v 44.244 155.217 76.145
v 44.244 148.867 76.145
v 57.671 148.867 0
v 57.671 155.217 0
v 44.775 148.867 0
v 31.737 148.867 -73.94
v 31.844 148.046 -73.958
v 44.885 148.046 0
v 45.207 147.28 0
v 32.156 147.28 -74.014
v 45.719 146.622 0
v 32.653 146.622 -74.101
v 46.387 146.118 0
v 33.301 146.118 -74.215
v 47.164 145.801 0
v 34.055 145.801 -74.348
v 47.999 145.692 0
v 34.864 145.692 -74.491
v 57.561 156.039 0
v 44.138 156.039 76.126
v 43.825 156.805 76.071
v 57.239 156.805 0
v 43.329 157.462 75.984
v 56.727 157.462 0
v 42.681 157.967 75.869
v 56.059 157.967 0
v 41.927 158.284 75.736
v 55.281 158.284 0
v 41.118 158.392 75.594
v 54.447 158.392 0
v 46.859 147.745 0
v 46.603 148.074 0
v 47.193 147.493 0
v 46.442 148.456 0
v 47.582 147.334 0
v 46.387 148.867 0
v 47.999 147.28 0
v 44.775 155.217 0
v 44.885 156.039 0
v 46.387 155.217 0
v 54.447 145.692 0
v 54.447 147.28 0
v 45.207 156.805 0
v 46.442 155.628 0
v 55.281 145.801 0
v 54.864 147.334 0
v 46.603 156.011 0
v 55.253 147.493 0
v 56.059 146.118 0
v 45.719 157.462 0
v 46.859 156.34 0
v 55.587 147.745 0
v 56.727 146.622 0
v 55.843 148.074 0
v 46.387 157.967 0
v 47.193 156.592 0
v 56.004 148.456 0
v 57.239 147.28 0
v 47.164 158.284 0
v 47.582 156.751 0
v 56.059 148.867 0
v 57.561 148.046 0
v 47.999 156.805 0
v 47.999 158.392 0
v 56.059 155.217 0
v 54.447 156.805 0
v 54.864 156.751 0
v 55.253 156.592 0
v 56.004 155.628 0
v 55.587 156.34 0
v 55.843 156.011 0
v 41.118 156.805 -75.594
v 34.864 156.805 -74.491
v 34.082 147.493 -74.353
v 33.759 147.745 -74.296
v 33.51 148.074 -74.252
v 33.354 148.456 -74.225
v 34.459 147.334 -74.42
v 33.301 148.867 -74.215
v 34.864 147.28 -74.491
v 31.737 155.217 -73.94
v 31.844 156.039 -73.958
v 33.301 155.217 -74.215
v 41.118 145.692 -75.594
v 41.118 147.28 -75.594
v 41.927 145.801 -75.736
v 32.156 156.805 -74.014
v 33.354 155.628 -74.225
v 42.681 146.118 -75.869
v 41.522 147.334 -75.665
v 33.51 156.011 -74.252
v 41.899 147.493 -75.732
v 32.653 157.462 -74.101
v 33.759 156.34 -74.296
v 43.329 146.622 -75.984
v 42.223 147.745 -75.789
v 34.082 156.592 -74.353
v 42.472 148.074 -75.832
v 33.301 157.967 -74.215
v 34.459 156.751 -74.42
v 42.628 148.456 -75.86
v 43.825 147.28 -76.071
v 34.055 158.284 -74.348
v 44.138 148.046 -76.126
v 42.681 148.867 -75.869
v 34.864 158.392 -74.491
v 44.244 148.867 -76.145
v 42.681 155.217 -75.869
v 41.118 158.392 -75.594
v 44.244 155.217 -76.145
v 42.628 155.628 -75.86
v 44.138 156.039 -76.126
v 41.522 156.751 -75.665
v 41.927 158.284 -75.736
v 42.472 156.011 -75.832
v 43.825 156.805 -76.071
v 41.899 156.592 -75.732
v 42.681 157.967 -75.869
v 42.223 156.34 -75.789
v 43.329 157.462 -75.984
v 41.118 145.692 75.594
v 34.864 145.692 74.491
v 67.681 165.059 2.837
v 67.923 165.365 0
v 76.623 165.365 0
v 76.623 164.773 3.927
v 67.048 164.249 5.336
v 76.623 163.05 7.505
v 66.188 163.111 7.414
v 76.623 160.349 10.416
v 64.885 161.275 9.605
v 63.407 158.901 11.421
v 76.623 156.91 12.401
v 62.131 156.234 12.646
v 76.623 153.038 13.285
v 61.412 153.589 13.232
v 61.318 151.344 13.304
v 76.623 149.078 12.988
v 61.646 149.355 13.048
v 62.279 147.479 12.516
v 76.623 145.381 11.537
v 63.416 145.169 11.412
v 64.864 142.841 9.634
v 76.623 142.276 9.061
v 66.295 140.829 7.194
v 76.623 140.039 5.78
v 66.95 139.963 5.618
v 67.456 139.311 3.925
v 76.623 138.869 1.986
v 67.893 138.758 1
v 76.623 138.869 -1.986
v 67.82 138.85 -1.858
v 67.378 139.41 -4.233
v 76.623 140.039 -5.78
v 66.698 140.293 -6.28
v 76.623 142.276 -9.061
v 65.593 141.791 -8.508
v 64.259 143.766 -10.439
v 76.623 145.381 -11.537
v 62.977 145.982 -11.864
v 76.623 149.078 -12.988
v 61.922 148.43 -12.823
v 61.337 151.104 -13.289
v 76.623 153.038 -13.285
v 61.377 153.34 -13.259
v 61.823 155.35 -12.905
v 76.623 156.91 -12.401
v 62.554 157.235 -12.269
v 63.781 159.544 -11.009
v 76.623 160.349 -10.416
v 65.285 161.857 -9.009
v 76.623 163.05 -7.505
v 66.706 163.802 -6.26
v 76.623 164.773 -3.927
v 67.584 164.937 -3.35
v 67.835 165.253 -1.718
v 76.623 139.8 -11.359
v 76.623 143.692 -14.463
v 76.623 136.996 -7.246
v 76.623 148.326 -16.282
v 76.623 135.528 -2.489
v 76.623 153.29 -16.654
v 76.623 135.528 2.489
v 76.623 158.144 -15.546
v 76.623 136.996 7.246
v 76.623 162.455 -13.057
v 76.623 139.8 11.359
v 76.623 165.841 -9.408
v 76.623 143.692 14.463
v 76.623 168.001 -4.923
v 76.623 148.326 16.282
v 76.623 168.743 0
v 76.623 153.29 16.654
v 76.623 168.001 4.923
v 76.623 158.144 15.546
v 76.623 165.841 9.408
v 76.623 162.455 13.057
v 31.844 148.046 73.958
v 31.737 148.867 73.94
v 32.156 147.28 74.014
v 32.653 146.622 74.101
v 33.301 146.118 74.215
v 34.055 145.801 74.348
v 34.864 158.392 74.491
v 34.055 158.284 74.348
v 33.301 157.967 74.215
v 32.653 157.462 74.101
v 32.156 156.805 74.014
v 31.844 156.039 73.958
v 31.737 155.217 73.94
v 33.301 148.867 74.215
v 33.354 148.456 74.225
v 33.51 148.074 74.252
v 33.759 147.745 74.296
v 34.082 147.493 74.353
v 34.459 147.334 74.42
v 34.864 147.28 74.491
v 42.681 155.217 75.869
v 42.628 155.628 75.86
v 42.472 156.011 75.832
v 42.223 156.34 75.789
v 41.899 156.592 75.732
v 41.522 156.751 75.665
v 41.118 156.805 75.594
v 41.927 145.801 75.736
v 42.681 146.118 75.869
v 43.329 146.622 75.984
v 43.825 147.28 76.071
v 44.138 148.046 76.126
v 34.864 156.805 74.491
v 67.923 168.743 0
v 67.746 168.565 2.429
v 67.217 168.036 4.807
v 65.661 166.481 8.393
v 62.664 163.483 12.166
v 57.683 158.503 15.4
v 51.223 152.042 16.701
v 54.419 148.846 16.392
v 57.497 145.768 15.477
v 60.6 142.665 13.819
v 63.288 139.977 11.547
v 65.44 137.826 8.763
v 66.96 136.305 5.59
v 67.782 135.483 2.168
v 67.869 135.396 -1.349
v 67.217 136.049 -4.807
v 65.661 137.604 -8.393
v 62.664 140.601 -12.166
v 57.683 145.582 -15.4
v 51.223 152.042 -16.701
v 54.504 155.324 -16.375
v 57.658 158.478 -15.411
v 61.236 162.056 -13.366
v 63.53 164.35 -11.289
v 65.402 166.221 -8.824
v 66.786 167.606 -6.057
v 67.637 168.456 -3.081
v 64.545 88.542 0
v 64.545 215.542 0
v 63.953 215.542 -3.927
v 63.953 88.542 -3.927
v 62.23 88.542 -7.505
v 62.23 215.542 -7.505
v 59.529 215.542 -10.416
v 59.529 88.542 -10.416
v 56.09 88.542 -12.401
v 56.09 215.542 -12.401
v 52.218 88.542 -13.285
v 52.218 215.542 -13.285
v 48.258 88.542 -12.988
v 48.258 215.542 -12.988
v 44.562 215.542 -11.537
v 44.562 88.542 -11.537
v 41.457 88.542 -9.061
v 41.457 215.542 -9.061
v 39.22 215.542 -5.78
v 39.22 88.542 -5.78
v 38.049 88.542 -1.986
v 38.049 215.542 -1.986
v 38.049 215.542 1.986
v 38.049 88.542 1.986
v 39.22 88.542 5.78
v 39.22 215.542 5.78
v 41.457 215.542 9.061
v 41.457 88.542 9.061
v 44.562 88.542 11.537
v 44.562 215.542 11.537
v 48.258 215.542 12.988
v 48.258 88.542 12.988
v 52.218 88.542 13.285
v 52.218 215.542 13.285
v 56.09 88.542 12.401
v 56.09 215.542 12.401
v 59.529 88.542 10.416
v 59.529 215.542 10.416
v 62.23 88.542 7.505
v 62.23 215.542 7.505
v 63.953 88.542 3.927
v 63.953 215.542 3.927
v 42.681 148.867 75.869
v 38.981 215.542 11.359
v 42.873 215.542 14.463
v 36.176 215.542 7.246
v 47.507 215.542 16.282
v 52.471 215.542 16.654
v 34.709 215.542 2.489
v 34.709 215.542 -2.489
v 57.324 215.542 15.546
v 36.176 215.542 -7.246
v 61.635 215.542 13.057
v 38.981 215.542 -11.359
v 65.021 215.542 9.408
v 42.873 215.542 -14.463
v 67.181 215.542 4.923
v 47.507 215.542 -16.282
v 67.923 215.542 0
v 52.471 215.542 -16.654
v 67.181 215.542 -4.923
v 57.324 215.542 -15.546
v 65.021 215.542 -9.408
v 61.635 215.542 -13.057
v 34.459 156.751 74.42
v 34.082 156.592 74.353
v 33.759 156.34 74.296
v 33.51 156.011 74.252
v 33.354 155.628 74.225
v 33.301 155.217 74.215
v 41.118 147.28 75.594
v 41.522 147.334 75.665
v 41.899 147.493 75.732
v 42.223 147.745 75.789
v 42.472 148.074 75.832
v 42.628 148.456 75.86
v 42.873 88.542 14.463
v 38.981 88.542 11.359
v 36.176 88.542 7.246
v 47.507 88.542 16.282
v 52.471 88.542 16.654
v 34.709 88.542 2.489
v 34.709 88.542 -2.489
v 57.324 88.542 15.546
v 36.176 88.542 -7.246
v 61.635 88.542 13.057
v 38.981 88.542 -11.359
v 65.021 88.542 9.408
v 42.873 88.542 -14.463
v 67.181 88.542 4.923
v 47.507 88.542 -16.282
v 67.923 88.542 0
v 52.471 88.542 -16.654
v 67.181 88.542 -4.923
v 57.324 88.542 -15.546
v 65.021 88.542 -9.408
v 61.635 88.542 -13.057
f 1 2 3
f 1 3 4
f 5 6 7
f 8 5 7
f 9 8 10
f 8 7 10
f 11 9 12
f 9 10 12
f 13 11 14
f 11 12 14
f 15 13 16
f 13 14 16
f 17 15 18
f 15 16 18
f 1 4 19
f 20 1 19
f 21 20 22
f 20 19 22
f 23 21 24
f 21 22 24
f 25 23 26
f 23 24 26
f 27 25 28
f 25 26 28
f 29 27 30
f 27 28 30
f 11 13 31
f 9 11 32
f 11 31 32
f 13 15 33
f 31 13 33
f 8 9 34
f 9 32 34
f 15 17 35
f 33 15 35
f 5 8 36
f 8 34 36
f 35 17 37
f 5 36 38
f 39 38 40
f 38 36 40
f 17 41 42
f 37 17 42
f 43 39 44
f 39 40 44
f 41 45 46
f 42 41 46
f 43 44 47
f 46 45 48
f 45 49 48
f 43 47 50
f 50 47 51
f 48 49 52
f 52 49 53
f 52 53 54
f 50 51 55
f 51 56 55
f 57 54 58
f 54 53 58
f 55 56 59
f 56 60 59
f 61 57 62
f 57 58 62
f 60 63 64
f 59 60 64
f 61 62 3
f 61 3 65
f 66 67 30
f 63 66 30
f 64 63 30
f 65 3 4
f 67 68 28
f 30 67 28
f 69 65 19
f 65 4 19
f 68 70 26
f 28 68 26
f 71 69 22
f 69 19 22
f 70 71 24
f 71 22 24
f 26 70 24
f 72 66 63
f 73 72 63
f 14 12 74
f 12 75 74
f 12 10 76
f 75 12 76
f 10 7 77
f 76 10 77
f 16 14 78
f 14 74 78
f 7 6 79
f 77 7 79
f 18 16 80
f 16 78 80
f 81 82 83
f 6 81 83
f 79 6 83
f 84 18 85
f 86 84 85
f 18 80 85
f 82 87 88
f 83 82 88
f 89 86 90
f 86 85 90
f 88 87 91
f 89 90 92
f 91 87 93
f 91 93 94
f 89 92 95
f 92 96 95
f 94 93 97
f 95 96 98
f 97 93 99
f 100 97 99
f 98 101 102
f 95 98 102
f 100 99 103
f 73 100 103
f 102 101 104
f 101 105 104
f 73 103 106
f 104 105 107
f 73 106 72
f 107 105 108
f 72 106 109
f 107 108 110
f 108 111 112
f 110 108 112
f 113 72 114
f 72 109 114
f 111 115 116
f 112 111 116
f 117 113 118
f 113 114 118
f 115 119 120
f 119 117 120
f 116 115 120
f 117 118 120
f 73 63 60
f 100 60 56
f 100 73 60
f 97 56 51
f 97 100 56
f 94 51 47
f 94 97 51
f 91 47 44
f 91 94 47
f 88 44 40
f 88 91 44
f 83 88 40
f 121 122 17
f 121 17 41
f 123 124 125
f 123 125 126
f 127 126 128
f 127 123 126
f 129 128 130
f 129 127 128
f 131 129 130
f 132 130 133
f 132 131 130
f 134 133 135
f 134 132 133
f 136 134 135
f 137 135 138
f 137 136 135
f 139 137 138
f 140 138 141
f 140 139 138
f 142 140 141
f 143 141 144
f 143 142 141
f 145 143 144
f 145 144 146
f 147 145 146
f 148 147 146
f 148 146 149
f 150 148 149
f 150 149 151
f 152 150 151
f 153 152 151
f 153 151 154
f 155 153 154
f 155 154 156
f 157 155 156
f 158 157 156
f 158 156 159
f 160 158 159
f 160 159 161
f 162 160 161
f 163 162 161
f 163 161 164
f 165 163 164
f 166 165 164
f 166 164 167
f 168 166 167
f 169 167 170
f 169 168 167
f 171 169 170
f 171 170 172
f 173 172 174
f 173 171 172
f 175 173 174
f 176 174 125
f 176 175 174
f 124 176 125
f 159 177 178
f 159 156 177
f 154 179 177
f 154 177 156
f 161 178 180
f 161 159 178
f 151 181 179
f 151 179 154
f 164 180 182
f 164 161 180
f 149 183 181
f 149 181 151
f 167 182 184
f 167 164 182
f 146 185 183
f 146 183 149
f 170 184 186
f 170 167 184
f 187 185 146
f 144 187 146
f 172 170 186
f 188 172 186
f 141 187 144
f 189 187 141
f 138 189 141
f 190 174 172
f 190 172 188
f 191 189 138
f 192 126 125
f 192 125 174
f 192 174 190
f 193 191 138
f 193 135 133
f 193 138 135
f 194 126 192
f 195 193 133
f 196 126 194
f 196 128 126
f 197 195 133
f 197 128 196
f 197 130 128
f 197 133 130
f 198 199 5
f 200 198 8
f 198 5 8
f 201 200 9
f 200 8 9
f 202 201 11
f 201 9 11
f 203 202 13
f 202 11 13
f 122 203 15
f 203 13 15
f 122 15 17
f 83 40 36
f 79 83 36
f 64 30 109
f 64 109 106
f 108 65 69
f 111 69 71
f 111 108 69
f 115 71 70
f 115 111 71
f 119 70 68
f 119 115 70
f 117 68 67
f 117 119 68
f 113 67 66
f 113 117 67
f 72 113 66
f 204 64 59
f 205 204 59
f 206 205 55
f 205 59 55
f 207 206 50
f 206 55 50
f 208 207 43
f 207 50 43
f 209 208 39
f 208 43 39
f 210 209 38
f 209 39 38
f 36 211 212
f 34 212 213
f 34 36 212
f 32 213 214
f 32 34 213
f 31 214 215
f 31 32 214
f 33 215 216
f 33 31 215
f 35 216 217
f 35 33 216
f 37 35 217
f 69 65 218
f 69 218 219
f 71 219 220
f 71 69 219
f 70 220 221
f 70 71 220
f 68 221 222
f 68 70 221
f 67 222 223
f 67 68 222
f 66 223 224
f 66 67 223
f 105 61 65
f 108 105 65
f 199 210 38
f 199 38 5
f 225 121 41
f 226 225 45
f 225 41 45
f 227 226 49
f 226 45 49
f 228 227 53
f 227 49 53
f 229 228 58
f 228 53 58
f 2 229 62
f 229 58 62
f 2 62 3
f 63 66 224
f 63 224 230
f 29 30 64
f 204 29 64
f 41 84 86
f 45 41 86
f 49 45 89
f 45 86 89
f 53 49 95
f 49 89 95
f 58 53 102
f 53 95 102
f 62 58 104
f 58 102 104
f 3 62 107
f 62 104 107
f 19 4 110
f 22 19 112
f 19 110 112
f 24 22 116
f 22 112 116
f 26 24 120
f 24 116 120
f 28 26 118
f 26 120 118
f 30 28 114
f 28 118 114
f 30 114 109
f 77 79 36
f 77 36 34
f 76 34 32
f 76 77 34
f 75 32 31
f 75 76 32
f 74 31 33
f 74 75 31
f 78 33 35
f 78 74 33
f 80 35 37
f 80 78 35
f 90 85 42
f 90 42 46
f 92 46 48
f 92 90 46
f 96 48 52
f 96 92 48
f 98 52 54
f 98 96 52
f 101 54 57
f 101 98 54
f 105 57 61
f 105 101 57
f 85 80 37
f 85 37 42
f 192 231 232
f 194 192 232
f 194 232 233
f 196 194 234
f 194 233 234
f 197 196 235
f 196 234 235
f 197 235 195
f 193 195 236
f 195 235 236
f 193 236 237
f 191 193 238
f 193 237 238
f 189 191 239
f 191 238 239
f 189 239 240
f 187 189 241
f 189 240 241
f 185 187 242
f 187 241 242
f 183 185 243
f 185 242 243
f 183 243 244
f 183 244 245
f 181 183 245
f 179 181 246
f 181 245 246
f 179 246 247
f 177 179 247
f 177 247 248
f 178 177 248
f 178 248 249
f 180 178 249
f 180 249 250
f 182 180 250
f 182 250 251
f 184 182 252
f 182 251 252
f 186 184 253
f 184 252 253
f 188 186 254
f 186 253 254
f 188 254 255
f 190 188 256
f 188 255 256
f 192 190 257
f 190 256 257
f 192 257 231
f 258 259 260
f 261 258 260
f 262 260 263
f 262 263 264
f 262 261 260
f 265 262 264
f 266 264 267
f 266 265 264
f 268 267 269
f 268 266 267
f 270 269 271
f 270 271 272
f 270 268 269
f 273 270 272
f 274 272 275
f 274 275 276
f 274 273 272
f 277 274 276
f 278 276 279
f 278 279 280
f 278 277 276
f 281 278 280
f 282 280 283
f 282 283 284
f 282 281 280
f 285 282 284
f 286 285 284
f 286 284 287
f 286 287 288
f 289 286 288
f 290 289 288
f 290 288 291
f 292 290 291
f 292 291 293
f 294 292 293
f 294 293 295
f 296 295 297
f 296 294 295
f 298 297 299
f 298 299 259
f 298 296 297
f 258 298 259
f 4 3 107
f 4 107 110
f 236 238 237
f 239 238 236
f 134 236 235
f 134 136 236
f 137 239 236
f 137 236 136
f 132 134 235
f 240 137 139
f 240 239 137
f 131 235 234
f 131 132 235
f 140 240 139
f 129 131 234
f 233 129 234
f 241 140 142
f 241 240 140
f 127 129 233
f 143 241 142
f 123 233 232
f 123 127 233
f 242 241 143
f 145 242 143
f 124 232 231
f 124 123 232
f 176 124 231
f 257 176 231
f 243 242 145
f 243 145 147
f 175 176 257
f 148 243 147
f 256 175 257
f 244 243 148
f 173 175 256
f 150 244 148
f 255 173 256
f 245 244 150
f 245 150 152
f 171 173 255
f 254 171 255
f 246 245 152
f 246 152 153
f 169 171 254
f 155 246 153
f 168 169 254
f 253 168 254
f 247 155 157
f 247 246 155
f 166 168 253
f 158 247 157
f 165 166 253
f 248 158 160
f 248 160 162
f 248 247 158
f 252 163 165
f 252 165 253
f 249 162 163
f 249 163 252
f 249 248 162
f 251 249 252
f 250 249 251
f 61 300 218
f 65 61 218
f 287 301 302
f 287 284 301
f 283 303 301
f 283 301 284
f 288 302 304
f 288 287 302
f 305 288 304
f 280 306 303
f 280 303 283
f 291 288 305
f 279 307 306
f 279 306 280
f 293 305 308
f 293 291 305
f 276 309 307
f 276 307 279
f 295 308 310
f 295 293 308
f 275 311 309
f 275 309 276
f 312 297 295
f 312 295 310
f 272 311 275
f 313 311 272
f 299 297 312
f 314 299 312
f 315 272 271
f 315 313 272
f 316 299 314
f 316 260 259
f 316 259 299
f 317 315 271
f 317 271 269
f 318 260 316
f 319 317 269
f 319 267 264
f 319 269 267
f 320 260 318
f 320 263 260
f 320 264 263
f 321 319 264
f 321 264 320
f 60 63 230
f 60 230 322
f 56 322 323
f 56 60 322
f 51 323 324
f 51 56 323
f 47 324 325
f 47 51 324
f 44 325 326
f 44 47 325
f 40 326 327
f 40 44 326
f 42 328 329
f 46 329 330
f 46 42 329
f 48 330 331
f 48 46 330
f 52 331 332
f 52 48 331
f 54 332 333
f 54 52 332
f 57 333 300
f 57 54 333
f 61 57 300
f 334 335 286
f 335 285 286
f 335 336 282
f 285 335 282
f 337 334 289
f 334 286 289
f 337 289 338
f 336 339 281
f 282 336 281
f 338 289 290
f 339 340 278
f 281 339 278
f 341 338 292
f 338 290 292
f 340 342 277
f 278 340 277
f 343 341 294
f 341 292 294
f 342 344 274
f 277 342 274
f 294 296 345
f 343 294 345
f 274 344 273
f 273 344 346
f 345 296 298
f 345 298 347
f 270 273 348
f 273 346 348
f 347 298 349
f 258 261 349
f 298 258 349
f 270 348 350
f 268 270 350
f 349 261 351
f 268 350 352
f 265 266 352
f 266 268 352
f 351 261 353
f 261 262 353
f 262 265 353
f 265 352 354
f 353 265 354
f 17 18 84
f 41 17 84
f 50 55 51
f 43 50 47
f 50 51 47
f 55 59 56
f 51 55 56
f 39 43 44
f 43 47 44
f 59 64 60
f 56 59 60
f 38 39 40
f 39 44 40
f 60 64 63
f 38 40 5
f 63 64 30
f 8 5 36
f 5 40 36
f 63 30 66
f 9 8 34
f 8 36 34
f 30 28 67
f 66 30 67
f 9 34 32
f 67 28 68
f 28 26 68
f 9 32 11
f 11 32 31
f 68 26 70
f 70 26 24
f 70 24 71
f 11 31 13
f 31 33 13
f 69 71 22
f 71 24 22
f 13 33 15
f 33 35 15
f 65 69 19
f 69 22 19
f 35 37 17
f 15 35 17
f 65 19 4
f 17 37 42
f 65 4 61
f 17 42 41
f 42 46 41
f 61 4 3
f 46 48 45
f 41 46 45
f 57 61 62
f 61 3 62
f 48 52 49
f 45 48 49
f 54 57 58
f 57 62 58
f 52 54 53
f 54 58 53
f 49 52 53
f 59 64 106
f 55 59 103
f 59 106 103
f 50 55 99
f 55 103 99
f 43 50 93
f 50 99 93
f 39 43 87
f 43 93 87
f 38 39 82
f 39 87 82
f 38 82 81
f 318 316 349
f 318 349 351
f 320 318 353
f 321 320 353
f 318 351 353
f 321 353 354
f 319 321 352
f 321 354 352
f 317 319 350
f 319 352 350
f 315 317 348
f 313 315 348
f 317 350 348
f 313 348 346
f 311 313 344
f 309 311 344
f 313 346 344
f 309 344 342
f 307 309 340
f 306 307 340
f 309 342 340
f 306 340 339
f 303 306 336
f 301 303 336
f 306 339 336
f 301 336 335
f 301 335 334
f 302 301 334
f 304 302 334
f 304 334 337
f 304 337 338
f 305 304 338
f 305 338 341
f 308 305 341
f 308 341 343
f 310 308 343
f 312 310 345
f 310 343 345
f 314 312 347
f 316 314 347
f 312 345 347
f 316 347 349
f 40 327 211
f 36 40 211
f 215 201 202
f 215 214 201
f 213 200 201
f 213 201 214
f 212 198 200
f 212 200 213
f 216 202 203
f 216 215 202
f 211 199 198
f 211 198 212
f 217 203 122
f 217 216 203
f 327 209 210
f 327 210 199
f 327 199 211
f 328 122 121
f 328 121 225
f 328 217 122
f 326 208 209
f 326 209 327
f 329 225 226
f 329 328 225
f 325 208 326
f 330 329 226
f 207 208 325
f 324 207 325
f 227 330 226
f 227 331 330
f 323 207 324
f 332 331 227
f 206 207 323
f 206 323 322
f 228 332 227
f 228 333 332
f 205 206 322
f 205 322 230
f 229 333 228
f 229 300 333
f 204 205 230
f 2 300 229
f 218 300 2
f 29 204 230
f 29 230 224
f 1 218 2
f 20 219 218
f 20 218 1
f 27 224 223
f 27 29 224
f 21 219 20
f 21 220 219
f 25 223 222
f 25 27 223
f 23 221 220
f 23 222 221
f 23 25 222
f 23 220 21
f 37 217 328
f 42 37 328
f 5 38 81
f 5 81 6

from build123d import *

# Parameters (mm, degrees)
STRUCTURAL_START                 = 51.22286437
STRUCTURAL_MEMBER1_OUTLINE_R     = 16.7005
STRUCTURAL_MEMBER1_OUTLINE_R_2   = 13.3223
STRUCTURAL_MEMBER1_DEPTH         = 25.4000001
STRUCTURAL_START_2               = 134
STRUCTURAL_MEMBER1_2_DEPTH       = 36
STRUCTURAL_START_3               = 88.54231741
STRUCTURAL_MEMBER1_3_OUTLINE_R   = 16.7005
STRUCTURAL_MEMBER1_3_OUTLINE_R_2 = 13.3223
STRUCTURAL_MEMBER1_3_DEPTH       = 127
STRUCTURAL_MEMBER2_DEPTH         = 78.783461448
STRUCTURAL_MEMBER2_2_DEPTH       = 76.2
STRUCTURAL_MEMBER2_2_DEPTH_BACK  = 2.583461448


with BuildPart() as part:
    # Structural Member1: read off the stored shape, not the designer's step
    # Structural Member1 outline → Structural Member1 (new body)
    with BuildSketch(Plane.YZ.offset(STRUCTURAL_START)):
        with Locations((152.04231741, 0)):
            Circle(STRUCTURAL_MEMBER1_OUTLINE_R)
        with Locations((152.04231741, 0)):
            Circle(STRUCTURAL_MEMBER1_OUTLINE_R_2, mode=Mode.SUBTRACT)
    extrude(amount=STRUCTURAL_MEMBER1_DEPTH)

    # Structural Member1 2 outline → Structural Member1 2 (cut)
    with BuildSketch(Plane(origin=(0, 0, 0), x_dir=(1, 0, 0), z_dir=(0, 1, 0)).offset(STRUCTURAL_START_2)):
        with BuildLine():
            ThreePointArc((51.22286447, -16.7005), (67.92336447, 0), (51.22286447, 16.7005))
            Line((51.22286447, 16.7005), (51.22286447, -16.7005))
        make_face()
    extrude(amount=STRUCTURAL_MEMBER1_2_DEPTH, mode=Mode.SUBTRACT)


with BuildPart() as body_2:
    # Structural Member1 3 outline → Structural Member1 3 (new body)
    with BuildSketch(Plane(origin=(0, 0, 0), x_dir=(1, 0, 0), z_dir=(0, 1, 0)).offset(STRUCTURAL_START_3)):
        with Locations((51.22286447, 0)):
            Circle(STRUCTURAL_MEMBER1_3_OUTLINE_R)
        with Locations((51.22286447, 0)):
            Circle(STRUCTURAL_MEMBER1_3_OUTLINE_R_2, mode=Mode.SUBTRACT)
    extrude(amount=STRUCTURAL_MEMBER1_3_DEPTH)


with BuildPart() as body_3:
    # Sketch1 on segment 1 (carried to segment 1) → Structural Member2 (new body)
    with BuildSketch(Plane(origin=(37.990873332, 152.04231741, -75.04235078), x_dir=(0.984807753, 0, -0.173648178), z_dir=(0.173648178, 0, 0.984807753))):
        with BuildLine():
            Line((-3.175, -6.35), (3.175, -6.35))
            ThreePointArc((3.175, -6.35), (5.42006403, -5.42006403), (6.35, -3.175))
            Line((6.35, -3.175), (6.35, 3.175))
            ThreePointArc((6.35, 3.175), (5.42006403, 5.42006403), (3.175, 6.35))
            Line((3.175, 6.35), (-3.175, 6.35))
            ThreePointArc((-3.175, 6.35), (-5.42006403, 5.42006403), (-6.35, 3.175))
            Line((-6.35, 3.175), (-6.35, -3.175))
            ThreePointArc((-6.35, -3.175), (-5.42006403, -5.42006403), (-3.175, -6.35))
        make_face()
        with BuildLine():
            Line((-3.175, -4.7625), (3.175, -4.7625))
            ThreePointArc((3.175, -4.7625), (4.297532015, -4.297532015), (4.7625, -3.175))
            Line((4.7625, -3.175), (4.7625, 3.175))
            ThreePointArc((4.7625, 3.175), (4.297532015, 4.297532015), (3.175, 4.7625))
            Line((3.175, 4.7625), (-3.175, 4.7625))
            ThreePointArc((-3.175, 4.7625), (-4.297532015, 4.297532015), (-4.7625, 3.175))
            Line((-4.7625, 3.175), (-4.7625, -3.175))
            ThreePointArc((-4.7625, -3.175), (-4.297532015, -4.297532015), (-3.175, -4.7625))
        make_face(mode=Mode.SUBTRACT)
    extrude(amount=STRUCTURAL_MEMBER2_DEPTH)

    # Structural Member2 mitre 1
    split(bisect_by=Plane(origin=(51.22286447, 152.04231741, 0), x_dir=(0, 1, 0), z_dir=(0, 0, -1)), keep=Keep.TOP)


with BuildPart() as body_4:
    # Sketch1 → Structural Member2 2 (new, two sides: drawn at the far end of the back side and taken through both)
    with BuildSketch(Plane(origin=(51.22286447, 152.04231741, 0), x_dir=(0.9848077530122076, 0, 0.17364817766693402), z_dir=(-0.17364817766693402, 0, 0.9848077530122076)).offset(-STRUCTURAL_MEMBER2_2_DEPTH_BACK)):
        with BuildLine():
            Line((-3.175, -6.35), (3.175, -6.35))
            ThreePointArc((3.175, -6.35), (5.42006403, -5.42006403), (6.35, -3.175))
            Line((6.35, -3.175), (6.35, 3.175))
            ThreePointArc((6.35, 3.175), (5.42006403, 5.42006403), (3.175, 6.35))
            Line((3.175, 6.35), (-3.175, 6.35))
            ThreePointArc((-3.175, 6.35), (-5.42006403, 5.42006403), (-6.35, 3.175))
            Line((-6.35, 3.175), (-6.35, -3.175))
            ThreePointArc((-6.35, -3.175), (-5.42006403, -5.42006403), (-3.175, -6.35))
        make_face()
        with BuildLine():
            Line((-3.175, -4.7625), (3.175, -4.7625))
            ThreePointArc((3.175, -4.7625), (4.297532015, -4.297532015), (4.7625, -3.175))
            Line((4.7625, -3.175), (4.7625, 3.175))
            ThreePointArc((4.7625, 3.175), (4.297532015, 4.297532015), (3.175, 4.7625))
            Line((3.175, 4.7625), (-3.175, 4.7625))
            ThreePointArc((-3.175, 4.7625), (-4.297532015, 4.297532015), (-4.7625, 3.175))
            Line((-4.7625, 3.175), (-4.7625, -3.175))
            ThreePointArc((-4.7625, -3.175), (-4.297532015, -4.297532015), (-3.175, -4.7625))
        make_face(mode=Mode.SUBTRACT)
    extrude(amount=STRUCTURAL_MEMBER2_2_DEPTH + STRUCTURAL_MEMBER2_2_DEPTH_BACK)

    # Structural Member2 2 mitre 1
    split(bisect_by=Plane(origin=(51.22286447, 152.04231741, 0), x_dir=(0, -1, 0), z_dir=(0, 0, 1)), keep=Keep.TOP)


solid = Compound([part.part, body_2.part, body_3.part, body_4.part])
